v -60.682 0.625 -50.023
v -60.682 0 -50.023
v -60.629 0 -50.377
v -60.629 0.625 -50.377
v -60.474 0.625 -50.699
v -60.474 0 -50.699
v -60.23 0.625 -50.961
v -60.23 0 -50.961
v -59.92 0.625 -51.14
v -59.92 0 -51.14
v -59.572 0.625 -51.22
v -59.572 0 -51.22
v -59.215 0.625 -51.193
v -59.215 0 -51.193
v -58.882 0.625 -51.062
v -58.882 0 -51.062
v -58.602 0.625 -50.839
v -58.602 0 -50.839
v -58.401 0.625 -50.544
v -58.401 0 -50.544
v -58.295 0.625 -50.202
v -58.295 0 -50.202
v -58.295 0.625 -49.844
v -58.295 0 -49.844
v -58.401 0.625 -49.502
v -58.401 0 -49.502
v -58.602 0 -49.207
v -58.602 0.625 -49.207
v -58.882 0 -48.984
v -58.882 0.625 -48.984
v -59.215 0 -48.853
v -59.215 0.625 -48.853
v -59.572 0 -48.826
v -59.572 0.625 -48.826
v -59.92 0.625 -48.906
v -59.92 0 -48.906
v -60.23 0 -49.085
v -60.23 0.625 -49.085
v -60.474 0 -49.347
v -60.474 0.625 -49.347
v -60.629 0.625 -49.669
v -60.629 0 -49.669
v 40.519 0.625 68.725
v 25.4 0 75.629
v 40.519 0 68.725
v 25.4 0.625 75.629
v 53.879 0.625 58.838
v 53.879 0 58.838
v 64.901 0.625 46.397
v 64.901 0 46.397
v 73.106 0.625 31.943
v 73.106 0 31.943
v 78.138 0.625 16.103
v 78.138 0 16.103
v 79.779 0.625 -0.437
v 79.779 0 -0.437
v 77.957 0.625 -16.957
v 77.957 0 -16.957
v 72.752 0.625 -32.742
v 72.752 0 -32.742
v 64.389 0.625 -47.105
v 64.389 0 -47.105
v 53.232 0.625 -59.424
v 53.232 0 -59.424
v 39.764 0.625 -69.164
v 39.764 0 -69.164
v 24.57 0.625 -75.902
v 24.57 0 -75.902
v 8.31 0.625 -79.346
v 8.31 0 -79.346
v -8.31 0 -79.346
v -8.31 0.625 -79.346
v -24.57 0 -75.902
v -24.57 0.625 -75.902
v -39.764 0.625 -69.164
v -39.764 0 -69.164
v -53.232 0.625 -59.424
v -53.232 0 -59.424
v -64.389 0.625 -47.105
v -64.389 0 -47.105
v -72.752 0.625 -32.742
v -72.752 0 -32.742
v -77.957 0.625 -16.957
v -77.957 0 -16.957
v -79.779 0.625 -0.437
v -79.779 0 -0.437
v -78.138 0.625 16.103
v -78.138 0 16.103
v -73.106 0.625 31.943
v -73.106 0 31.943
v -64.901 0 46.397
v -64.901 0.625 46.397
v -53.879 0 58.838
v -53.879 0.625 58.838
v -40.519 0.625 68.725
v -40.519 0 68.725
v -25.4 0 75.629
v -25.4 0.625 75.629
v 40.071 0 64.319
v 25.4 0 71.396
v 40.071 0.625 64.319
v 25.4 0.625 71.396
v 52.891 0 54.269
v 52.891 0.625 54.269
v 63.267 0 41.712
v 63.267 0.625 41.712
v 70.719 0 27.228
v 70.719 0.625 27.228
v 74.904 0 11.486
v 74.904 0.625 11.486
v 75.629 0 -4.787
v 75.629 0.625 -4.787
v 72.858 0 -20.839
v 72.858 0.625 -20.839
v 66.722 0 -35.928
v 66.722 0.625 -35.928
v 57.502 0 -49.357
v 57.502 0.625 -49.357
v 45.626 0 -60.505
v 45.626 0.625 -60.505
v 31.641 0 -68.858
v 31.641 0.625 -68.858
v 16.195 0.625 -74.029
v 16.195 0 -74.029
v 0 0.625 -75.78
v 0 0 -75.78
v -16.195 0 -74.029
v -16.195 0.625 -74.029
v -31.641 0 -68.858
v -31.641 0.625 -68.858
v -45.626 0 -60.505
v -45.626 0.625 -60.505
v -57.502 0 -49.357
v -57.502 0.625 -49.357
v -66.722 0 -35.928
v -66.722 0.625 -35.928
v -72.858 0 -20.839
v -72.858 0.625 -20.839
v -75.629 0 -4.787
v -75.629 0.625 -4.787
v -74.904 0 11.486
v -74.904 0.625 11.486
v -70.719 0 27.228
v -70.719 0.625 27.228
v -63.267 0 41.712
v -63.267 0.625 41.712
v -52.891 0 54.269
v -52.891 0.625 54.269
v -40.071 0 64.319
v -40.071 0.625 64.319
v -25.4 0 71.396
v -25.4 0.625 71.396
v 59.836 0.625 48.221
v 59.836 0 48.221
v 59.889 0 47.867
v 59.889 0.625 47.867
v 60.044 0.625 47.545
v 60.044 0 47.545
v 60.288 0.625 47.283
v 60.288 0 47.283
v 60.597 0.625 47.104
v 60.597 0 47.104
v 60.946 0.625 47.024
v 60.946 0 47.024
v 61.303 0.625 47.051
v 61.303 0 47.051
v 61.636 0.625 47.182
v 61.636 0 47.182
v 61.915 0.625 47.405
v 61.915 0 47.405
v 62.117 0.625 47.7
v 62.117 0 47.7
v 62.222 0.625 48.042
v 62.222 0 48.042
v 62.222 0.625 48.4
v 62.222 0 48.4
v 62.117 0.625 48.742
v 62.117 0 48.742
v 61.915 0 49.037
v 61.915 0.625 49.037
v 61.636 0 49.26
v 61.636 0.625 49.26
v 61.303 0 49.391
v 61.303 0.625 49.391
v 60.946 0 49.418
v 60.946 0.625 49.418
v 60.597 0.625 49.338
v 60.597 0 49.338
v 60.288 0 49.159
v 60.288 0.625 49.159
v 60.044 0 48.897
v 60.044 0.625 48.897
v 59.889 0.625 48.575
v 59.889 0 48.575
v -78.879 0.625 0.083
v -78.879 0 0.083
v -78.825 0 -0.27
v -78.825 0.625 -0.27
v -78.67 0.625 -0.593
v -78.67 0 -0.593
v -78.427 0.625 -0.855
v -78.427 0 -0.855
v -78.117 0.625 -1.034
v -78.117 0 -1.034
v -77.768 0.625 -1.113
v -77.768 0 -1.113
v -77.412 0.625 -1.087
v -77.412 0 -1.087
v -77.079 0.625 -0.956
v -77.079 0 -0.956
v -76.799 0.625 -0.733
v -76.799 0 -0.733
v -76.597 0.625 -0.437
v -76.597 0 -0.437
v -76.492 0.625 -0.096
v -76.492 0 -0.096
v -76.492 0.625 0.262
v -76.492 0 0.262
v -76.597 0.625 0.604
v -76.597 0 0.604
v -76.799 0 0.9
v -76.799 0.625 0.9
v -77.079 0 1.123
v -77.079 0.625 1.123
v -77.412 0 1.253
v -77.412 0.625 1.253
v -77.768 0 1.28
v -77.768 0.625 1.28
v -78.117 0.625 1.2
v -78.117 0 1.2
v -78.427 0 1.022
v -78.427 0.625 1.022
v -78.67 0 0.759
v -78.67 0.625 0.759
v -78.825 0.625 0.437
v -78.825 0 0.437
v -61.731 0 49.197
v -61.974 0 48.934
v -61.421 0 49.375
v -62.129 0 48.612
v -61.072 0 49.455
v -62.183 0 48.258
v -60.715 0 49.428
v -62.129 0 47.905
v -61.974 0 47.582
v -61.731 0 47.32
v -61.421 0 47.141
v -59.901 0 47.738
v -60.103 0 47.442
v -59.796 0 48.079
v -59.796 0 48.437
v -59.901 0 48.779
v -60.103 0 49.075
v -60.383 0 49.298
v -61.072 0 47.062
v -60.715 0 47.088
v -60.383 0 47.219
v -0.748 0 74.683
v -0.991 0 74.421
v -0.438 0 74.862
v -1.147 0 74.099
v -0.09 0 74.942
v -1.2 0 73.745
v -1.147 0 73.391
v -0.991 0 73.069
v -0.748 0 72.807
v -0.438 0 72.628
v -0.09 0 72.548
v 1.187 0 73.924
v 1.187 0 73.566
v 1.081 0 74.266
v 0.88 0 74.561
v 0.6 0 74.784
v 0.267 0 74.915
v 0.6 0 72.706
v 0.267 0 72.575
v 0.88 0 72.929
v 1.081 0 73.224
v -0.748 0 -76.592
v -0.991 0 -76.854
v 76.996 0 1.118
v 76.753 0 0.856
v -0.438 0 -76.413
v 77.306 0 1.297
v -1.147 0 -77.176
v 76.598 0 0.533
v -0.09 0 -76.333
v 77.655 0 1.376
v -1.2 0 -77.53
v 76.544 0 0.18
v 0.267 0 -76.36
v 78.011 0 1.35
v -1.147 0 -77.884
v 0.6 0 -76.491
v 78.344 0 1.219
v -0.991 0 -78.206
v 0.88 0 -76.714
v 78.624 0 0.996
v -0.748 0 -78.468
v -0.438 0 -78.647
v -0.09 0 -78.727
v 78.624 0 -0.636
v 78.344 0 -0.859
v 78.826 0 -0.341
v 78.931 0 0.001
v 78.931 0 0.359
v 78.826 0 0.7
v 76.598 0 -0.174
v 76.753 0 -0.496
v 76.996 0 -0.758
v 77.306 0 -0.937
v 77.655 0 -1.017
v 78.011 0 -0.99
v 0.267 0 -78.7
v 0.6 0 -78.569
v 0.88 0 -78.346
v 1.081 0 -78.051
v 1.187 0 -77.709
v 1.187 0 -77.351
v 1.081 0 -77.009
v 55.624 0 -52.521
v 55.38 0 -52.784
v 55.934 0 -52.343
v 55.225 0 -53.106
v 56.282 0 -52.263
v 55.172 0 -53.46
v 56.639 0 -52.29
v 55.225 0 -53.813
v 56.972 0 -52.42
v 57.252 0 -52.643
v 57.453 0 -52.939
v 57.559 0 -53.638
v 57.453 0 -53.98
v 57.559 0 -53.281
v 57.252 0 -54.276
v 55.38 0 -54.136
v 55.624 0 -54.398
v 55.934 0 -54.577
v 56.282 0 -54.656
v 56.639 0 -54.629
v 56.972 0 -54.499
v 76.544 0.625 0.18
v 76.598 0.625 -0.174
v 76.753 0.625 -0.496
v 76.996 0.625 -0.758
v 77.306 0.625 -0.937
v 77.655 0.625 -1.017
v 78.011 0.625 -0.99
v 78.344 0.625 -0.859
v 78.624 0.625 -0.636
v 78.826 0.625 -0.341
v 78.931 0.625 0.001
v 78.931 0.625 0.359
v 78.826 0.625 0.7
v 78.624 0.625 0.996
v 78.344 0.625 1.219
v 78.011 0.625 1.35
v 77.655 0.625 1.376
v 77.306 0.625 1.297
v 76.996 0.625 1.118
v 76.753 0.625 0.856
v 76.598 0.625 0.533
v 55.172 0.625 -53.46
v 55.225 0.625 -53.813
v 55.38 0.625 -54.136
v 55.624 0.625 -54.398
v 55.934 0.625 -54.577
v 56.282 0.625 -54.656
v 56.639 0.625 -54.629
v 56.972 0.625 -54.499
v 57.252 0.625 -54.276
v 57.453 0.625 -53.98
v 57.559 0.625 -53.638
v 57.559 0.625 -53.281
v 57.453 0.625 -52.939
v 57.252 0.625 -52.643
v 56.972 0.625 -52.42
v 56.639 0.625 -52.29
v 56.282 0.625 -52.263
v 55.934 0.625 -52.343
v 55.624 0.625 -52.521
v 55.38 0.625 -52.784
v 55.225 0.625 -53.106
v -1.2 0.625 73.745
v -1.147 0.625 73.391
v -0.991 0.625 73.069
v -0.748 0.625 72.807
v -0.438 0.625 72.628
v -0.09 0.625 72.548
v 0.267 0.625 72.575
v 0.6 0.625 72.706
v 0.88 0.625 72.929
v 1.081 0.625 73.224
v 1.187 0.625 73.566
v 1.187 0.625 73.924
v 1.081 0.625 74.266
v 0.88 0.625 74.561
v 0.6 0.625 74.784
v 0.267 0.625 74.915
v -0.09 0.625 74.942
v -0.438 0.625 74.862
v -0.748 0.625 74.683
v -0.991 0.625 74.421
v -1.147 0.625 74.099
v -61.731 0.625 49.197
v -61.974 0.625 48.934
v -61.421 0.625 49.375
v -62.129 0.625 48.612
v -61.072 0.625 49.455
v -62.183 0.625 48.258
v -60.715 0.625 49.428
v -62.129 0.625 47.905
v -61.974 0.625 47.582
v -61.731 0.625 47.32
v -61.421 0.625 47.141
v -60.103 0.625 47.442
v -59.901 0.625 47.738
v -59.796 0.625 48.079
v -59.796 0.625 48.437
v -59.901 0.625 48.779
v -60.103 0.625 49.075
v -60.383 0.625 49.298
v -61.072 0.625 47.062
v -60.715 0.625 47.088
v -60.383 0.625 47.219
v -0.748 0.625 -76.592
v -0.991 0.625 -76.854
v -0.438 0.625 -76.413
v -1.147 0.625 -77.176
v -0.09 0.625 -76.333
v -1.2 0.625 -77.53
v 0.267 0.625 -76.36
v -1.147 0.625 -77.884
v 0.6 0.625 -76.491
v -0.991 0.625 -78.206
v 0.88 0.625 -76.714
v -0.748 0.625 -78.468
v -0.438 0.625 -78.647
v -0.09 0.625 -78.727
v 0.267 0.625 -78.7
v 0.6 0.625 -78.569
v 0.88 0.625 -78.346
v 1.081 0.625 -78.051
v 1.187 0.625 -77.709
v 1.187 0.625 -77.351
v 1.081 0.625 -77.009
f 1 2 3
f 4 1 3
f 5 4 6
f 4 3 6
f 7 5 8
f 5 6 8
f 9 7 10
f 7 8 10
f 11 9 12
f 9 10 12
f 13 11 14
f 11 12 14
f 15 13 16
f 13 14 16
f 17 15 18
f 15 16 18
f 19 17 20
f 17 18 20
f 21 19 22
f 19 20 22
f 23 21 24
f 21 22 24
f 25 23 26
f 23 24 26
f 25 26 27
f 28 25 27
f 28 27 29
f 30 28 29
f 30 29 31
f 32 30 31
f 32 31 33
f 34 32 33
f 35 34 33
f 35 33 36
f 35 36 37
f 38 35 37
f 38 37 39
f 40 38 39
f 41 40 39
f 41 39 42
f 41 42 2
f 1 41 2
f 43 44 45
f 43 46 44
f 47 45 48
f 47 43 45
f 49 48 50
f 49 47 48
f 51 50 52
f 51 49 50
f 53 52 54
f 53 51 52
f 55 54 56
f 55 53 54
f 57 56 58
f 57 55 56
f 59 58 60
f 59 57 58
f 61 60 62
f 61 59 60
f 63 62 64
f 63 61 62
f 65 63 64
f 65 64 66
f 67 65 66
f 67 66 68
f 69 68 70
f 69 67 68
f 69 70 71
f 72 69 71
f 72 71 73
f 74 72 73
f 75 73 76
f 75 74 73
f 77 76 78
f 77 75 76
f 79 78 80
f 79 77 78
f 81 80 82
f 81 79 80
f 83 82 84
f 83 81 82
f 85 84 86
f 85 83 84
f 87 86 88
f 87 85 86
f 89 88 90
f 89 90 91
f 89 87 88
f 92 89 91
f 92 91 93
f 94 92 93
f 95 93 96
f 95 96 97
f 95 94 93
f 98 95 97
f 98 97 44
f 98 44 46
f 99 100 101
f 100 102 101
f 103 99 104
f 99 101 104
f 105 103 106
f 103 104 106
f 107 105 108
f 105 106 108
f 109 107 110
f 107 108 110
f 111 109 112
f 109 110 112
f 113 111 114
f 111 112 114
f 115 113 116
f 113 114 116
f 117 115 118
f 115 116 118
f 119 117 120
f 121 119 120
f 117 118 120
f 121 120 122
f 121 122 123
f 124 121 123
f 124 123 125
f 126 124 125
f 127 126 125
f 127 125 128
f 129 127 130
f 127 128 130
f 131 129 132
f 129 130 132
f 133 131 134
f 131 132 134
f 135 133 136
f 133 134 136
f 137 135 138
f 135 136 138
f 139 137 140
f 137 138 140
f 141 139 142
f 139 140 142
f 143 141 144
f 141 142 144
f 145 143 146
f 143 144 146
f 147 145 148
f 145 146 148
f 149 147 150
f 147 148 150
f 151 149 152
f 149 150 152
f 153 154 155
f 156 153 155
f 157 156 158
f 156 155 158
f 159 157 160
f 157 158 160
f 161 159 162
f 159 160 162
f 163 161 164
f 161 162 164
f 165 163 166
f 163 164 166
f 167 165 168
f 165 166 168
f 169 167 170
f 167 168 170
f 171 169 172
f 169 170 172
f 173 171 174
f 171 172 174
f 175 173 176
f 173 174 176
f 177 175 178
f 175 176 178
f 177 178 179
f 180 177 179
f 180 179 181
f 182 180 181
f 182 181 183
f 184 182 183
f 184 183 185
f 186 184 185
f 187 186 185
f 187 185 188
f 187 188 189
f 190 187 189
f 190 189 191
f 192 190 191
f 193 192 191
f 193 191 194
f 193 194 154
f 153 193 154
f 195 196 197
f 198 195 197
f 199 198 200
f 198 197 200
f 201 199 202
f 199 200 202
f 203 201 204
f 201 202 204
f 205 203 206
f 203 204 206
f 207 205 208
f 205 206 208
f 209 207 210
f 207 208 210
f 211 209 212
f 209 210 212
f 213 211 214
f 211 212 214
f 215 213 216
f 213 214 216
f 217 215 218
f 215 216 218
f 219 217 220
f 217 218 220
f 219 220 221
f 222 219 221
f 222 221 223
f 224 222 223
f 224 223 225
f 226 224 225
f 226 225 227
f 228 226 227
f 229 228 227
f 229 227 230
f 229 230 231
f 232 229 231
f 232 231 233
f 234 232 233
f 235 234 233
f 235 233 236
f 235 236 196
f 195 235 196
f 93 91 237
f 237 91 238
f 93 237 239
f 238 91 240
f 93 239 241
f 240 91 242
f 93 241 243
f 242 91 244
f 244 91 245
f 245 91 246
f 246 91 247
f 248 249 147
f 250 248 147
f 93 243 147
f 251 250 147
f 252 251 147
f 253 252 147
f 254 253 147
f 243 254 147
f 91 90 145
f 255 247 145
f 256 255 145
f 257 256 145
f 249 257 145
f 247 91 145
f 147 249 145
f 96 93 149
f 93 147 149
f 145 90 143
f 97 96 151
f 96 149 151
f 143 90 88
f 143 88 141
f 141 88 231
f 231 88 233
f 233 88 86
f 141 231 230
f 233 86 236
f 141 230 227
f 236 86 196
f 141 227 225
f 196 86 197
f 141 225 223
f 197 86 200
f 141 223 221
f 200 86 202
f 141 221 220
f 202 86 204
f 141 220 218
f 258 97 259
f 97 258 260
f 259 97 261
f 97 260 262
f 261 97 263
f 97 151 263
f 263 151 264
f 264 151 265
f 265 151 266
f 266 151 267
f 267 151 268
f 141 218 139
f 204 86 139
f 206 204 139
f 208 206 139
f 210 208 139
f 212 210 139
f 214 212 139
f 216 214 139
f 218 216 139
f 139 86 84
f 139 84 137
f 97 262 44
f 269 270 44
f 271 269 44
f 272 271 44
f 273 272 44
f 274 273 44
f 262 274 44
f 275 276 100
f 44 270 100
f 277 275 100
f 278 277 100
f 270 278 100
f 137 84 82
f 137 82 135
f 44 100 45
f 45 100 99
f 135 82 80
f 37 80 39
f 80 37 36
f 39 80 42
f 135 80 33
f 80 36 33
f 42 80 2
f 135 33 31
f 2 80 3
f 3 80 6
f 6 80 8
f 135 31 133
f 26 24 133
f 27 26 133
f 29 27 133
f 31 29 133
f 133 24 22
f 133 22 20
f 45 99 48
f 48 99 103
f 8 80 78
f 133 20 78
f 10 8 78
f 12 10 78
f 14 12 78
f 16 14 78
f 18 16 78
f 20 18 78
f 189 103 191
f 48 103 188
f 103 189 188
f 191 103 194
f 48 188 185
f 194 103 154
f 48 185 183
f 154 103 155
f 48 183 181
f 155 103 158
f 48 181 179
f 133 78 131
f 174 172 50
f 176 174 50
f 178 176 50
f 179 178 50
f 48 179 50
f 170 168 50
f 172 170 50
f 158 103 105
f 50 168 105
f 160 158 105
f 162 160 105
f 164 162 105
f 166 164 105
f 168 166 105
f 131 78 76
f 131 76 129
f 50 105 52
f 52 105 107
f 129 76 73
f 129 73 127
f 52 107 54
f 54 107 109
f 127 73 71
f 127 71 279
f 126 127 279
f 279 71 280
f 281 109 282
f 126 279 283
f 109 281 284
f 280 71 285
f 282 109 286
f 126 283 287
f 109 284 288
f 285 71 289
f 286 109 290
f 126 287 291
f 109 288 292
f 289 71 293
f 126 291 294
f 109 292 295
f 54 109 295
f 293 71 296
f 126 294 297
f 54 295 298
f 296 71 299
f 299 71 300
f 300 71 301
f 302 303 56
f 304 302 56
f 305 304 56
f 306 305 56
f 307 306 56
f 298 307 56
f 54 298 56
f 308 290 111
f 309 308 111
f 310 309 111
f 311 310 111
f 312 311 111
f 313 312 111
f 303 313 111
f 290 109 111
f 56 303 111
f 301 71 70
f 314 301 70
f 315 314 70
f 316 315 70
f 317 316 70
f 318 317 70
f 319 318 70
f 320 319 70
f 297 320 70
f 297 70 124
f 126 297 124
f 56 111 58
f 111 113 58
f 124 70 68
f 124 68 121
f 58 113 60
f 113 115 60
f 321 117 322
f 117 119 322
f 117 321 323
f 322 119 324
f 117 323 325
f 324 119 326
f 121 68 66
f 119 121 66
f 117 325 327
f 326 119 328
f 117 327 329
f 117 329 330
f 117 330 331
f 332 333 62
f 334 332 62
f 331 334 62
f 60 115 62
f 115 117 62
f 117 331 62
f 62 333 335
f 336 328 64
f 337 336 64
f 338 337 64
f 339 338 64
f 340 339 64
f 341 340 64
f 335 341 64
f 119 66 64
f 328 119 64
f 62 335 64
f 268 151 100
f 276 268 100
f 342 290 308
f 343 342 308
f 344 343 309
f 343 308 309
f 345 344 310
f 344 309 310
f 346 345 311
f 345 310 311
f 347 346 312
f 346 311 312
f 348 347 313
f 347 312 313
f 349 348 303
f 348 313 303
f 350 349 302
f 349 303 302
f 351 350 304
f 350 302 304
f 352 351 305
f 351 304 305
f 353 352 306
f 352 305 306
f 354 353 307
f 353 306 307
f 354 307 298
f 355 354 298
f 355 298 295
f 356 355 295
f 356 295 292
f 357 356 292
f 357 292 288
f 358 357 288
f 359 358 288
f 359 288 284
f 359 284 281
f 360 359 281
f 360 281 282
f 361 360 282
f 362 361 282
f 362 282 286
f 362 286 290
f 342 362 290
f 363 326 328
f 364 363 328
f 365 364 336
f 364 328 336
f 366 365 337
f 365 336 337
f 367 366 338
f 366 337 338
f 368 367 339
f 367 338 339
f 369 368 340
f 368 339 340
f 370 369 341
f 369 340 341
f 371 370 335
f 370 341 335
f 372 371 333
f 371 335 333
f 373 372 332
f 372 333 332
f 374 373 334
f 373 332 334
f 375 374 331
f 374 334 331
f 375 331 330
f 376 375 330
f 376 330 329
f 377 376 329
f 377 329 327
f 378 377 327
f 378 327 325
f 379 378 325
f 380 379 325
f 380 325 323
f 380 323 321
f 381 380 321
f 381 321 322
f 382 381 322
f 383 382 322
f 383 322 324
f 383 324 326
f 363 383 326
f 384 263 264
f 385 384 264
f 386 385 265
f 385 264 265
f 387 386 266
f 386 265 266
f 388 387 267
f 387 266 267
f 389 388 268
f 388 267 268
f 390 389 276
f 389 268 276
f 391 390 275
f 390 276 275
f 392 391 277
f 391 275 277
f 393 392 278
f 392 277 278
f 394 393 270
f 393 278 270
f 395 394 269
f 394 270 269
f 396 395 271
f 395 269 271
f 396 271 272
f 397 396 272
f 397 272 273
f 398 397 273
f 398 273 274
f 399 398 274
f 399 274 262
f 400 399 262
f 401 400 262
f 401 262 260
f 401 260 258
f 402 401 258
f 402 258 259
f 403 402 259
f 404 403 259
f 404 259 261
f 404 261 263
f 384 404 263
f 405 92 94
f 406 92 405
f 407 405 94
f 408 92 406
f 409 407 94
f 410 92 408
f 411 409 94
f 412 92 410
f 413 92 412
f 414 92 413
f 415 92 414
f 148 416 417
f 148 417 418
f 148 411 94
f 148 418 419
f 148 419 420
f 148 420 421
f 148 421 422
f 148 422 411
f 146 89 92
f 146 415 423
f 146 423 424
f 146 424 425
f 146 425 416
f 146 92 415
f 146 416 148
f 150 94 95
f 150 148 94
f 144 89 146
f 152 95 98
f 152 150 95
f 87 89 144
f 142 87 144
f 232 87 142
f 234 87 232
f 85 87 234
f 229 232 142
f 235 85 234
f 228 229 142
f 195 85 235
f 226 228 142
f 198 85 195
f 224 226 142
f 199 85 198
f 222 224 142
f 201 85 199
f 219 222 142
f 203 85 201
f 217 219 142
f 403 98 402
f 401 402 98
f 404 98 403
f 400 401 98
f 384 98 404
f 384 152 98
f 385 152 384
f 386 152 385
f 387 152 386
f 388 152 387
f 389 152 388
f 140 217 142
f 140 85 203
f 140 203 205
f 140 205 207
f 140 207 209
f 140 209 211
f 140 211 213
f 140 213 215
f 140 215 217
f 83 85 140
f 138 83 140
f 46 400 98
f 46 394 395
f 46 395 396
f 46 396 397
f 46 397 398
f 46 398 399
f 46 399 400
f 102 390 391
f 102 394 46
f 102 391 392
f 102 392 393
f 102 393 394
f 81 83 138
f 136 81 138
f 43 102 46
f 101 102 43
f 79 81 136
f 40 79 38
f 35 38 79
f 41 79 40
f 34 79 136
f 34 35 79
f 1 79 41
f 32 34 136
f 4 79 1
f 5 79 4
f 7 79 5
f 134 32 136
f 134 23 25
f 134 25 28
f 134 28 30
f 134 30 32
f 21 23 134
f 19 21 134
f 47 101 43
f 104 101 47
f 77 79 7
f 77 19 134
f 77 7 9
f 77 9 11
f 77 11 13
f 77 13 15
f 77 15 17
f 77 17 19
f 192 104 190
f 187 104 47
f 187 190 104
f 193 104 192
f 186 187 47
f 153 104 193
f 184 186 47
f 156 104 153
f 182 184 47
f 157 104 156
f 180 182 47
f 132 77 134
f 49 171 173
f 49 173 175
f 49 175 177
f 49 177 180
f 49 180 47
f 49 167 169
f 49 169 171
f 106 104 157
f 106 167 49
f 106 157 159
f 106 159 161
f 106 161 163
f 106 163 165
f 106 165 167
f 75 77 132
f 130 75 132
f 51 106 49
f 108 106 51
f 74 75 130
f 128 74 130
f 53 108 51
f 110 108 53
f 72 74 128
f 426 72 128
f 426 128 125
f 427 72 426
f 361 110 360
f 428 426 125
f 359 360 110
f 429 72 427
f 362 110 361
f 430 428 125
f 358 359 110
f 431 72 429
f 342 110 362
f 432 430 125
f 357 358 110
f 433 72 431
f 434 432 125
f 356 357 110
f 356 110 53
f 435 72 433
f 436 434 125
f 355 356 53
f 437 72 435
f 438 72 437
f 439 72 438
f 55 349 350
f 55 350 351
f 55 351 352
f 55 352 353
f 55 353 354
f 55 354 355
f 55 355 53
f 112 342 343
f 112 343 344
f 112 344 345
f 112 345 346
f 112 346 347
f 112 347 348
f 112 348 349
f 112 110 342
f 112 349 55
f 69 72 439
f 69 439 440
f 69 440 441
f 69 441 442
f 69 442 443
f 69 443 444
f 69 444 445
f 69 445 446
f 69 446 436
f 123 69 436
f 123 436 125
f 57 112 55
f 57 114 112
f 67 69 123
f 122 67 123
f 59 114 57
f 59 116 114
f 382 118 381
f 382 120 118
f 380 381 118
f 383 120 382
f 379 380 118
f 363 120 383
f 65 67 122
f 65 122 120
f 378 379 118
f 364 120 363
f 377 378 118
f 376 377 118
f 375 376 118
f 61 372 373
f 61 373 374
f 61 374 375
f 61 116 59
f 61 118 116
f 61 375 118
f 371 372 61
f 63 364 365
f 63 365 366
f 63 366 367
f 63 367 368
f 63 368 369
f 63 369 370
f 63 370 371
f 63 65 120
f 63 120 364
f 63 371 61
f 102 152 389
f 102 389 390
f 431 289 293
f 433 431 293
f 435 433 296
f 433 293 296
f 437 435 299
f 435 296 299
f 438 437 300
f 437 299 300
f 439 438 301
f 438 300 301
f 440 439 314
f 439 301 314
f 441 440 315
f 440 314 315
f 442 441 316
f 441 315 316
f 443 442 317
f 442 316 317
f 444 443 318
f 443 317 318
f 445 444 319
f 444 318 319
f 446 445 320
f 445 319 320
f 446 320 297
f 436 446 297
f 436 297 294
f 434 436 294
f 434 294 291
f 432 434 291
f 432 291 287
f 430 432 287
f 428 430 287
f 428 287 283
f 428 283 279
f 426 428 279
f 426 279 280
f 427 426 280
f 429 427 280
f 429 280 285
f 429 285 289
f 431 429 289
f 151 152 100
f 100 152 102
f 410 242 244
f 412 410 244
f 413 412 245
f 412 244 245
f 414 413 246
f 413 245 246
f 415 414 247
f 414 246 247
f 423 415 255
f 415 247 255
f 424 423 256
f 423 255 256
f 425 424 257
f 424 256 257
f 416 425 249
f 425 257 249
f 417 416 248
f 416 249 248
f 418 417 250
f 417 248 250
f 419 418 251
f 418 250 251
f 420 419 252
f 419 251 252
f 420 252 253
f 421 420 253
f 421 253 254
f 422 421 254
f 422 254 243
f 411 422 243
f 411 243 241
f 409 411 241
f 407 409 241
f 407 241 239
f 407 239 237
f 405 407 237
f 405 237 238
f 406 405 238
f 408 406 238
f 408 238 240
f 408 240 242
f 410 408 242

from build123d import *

# Parameters (mm, degrees)
THICKEN1_T1          = 0.625
M2_CLEARANCE_HOLE1_D = 2.4


with BuildPart() as body_1:
    # Sketch1 → Surface-Fill1: a flat surface bounded by the sketch
    with BuildSketch(Plane(origin=(0, 0, 0), x_dir=(1, 0, 0), z_dir=(0, 1, 0)), mode=Mode.PRIVATE) as surface_fill1_1_region:
        with BuildLine():
            Line((-25.4, -75.628621566), (25.4, -75.628621566))
            ThreePointArc((25.4, -75.628621566), (0, 79.78), (-25.4, -75.628621566))
        make_face()
        with BuildLine():
            Line((-25.4, -71.396417277), (25.4, -71.396417277))
            ThreePointArc((25.4, -71.396417277), (0, 75.78), (-25.4, -71.396417277))
        make_face(mode=Mode.SUBTRACT)
    surface_fill1_1 = surface_fill1_1_region.sketch.faces()[0]
    add(Solid.thicken(surface_fill1_1, THICKEN1_T1))

    # M2 Clearance Hole1 (through all)
    with Locations(Plane(origin=(0, 0.625, 0), x_dir=(1, 0, 0), z_dir=(0, 1, 0))):
        with Locations((0, 77.529954233), (0, -73.744874158), (77.744469628, -0.179745534), (-77.678576515, -0.083327834), (56.371935899, 53.45957237), (-59.482060021, 50.023142165), (61.035706748, -48.220860015), (-60.982517002, -48.258309848)):
            Hole(M2_CLEARANCE_HOLE1_D / 2)


solid = body_1.part
